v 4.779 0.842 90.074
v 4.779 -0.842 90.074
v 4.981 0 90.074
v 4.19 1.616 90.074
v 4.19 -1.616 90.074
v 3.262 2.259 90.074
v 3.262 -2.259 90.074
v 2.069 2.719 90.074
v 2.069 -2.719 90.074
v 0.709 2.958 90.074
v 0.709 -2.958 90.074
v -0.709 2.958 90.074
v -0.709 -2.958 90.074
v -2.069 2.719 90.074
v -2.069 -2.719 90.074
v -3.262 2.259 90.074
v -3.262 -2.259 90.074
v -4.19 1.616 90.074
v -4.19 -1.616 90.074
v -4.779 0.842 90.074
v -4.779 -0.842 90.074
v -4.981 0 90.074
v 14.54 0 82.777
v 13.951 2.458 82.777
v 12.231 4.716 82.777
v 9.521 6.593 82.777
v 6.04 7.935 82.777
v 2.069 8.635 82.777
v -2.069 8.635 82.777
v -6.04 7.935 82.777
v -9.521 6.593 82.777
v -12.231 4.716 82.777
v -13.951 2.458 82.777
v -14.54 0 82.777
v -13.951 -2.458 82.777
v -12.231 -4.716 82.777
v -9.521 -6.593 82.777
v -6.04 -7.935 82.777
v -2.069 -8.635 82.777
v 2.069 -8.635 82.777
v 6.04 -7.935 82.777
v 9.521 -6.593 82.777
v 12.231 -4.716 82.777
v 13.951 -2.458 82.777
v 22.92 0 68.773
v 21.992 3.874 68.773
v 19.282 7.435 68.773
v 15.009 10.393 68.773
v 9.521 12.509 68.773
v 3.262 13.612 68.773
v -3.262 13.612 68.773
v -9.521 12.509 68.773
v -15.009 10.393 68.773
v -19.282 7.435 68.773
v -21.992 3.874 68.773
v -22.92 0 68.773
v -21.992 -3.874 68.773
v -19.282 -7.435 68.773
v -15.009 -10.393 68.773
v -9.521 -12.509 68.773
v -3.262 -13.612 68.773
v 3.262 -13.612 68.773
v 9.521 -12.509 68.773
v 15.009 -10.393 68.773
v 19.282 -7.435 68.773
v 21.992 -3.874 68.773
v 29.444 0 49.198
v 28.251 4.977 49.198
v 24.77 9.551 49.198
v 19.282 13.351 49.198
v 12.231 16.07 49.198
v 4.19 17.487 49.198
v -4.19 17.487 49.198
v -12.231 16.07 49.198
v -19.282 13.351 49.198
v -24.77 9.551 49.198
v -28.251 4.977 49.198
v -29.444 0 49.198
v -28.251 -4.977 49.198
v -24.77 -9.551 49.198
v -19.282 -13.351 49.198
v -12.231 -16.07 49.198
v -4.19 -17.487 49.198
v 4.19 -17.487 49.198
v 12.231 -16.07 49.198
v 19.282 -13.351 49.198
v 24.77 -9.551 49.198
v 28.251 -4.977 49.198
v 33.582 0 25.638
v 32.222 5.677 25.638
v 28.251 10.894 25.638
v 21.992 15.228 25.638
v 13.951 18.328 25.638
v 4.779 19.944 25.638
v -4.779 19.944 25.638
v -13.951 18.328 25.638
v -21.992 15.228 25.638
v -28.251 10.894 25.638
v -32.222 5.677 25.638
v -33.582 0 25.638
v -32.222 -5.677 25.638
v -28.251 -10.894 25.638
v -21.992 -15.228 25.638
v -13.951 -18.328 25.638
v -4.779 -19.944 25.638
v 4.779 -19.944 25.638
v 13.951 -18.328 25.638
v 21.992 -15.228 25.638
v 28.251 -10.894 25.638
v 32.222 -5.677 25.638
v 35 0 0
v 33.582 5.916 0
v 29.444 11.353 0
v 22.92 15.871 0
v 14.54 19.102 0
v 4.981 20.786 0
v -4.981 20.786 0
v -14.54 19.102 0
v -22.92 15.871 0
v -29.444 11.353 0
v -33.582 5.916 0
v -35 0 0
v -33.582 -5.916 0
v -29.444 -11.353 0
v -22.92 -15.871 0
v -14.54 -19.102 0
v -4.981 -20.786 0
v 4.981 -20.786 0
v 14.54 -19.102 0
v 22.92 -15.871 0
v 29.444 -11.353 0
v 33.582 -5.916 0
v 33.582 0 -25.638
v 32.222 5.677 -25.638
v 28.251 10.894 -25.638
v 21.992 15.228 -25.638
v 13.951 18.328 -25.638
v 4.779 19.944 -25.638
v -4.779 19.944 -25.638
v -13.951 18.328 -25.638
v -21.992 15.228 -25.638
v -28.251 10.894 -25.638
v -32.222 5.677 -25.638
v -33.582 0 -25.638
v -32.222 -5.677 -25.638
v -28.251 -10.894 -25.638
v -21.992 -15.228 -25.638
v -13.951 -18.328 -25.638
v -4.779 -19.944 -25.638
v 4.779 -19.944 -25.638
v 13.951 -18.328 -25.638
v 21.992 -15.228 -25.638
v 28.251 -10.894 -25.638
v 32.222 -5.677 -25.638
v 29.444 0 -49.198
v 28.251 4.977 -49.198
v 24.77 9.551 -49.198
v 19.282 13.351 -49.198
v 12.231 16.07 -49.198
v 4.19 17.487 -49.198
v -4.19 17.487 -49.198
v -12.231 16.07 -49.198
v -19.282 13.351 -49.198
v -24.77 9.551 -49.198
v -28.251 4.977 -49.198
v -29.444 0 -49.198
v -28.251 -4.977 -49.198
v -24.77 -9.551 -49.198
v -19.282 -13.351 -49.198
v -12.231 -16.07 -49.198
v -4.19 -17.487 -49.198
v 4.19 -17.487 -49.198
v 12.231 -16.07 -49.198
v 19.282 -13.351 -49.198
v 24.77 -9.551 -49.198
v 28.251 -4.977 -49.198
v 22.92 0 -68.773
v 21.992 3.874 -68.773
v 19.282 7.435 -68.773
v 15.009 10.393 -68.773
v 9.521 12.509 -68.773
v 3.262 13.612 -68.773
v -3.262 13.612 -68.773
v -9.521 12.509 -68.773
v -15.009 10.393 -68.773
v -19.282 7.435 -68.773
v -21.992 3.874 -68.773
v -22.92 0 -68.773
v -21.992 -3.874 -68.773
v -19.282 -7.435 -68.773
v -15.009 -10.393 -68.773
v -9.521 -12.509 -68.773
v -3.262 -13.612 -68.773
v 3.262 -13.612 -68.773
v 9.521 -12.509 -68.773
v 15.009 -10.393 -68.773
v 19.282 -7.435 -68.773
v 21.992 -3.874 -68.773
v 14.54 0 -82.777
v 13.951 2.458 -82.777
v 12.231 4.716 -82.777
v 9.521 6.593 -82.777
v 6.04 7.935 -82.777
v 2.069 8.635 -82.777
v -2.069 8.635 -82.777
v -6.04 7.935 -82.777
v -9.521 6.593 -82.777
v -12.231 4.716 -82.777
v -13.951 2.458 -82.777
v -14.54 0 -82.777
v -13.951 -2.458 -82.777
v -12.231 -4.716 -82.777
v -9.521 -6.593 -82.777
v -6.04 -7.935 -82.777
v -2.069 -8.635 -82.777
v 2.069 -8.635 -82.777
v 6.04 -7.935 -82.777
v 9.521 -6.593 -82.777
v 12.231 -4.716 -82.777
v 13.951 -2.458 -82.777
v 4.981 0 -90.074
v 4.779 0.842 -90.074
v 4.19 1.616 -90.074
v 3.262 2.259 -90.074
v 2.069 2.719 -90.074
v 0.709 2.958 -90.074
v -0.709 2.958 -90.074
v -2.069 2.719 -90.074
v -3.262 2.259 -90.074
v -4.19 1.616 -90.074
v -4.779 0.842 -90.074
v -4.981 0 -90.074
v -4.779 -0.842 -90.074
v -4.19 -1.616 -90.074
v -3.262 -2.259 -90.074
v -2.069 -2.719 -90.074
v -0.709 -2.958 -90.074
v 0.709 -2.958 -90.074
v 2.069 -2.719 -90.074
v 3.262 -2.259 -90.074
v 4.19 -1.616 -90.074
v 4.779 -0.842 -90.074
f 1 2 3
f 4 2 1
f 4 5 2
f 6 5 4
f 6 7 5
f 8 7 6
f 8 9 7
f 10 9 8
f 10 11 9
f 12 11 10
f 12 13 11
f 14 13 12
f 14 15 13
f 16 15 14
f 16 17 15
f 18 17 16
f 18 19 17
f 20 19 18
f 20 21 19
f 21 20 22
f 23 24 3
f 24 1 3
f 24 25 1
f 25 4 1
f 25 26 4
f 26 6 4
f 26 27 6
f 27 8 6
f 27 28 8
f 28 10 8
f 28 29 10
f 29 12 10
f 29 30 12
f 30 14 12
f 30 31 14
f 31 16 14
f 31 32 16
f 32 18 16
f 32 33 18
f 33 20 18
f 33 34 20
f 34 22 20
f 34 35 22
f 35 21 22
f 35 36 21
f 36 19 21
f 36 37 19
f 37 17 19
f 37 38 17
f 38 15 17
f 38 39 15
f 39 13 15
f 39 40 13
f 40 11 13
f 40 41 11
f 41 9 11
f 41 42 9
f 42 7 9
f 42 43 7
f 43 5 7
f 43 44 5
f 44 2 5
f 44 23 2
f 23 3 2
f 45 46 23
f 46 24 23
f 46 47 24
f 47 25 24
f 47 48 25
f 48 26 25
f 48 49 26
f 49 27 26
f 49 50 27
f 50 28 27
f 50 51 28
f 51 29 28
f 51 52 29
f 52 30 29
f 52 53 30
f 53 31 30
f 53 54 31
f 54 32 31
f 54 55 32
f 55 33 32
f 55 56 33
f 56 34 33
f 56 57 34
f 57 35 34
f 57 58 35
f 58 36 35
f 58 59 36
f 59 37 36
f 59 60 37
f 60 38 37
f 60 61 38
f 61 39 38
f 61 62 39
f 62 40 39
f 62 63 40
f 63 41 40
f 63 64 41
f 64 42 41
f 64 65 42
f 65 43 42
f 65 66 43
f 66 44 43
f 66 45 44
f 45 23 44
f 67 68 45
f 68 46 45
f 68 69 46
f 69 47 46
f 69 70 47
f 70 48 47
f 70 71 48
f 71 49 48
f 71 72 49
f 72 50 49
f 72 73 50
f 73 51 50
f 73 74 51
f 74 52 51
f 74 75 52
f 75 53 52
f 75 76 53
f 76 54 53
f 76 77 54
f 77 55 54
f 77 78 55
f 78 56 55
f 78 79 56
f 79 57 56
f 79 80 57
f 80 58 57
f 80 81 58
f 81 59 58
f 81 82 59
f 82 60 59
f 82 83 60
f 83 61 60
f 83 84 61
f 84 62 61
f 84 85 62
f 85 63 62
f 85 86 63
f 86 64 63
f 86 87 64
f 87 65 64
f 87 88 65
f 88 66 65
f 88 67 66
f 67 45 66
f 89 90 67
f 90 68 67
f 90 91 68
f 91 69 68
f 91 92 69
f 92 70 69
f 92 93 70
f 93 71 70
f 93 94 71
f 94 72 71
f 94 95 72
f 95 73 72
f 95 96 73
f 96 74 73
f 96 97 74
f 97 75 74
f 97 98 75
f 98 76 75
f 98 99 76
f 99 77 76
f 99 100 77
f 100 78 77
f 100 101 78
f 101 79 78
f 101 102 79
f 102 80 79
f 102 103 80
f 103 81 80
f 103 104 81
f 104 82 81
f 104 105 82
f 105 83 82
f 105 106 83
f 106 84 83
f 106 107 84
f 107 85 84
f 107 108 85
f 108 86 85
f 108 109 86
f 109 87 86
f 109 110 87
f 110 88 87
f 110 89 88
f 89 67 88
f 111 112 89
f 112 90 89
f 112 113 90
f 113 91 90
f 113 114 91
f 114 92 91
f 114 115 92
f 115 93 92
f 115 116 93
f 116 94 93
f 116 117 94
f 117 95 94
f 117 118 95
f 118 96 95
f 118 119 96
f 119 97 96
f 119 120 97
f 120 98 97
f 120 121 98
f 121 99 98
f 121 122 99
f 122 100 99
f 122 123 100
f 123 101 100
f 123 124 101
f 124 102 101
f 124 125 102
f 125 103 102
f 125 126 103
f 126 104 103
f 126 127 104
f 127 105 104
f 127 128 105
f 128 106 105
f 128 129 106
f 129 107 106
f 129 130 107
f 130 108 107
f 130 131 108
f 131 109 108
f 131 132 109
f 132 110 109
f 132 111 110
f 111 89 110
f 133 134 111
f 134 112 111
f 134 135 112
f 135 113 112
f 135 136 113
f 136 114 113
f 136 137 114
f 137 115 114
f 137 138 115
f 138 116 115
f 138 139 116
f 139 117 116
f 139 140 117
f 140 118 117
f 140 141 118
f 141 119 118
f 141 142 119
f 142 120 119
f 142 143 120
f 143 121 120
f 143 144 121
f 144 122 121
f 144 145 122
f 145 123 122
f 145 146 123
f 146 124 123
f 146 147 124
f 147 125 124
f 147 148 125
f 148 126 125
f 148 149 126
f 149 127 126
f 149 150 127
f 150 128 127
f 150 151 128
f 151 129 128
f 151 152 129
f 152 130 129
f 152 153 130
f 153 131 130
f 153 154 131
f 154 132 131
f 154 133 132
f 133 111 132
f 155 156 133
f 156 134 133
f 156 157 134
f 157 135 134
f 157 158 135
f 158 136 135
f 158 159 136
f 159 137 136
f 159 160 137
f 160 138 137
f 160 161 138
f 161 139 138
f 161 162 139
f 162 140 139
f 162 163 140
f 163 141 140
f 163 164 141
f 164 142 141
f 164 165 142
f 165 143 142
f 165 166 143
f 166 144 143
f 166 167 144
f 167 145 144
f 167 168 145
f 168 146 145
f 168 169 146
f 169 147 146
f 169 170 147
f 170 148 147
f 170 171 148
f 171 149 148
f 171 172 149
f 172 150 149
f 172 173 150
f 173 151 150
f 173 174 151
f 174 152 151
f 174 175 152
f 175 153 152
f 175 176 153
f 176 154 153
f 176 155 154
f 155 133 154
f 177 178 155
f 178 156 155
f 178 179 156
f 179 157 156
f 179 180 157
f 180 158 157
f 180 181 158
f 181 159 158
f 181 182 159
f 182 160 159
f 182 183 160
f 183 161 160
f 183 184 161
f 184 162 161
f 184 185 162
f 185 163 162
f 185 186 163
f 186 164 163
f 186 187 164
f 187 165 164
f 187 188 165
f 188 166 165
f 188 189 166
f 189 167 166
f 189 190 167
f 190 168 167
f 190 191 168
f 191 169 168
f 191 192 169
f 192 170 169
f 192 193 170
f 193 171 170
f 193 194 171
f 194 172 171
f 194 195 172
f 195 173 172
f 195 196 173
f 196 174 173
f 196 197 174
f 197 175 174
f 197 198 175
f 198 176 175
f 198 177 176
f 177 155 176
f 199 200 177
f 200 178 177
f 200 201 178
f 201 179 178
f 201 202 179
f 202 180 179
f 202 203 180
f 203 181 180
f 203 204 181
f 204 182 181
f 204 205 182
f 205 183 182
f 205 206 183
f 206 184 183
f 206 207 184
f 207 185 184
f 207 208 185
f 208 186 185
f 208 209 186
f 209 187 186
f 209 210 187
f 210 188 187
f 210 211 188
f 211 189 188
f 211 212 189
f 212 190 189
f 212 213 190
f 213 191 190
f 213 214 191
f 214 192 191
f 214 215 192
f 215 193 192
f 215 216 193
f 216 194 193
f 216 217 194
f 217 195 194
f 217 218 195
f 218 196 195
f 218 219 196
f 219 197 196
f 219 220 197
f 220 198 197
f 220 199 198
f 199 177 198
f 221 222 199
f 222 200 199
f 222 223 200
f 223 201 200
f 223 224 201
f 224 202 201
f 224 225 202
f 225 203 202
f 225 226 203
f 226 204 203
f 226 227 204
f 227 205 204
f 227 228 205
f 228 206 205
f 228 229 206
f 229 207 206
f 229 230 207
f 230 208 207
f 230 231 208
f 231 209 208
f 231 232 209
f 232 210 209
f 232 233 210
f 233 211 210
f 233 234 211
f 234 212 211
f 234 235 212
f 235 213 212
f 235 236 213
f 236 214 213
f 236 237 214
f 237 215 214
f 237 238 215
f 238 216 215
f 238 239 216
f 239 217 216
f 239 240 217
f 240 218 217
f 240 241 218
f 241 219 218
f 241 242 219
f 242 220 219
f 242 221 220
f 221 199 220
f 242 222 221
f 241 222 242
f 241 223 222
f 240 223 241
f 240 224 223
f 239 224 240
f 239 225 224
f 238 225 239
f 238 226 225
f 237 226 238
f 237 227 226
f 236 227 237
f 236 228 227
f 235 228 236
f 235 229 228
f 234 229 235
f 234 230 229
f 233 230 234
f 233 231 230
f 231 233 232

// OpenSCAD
// Generated by SolidPython 1.0.1 on 2020-07-29 00:46:46


scale(v = [5, 3, 13]) {
	sphere(r = 7);
}
/***********************************************
*********      SolidPython code:      **********
************************************************
 
# import packages: SolidPython
from solid import *
from solid.utils import *
from itertools import chain, combinations, permutations


class Resize:

    def __init__(self, scad_file):
        self.scad_file = scad_file
        #self.scad_file = import_scad(scad_file)
        # cone/cylinder param:
        self.r1 = 0
        self.r2 = 0
        self.h = 0
        # rectangular prism param:
        self.w = 0
        self.l = 0
        # ellipse param:
        self.r = 0

    # import OpenScad code (file name corresponds to shape)


    # classify shape + parameters
    def assign(self, param1, param2, param3):
        if self.scad_file == 'cone.scad':
            self.r1 = param1
            self.r2 = param2
            self.h = param3
        elif self.scad_file == 'cylinder.scad':
            self.r1 = param1
            self.r2 = param2
            self.h = param3
        elif self.scad_file == 'rectangularPrism.scad':
            self.h = param1
            self.l = param2
            self.w = param3
        else:
            self.r = param1
            self.h = param2

    # resize parameters
    def iterate(self):
        x = range(3, 20, 2)
        i = 1
        if self.scad_file == 'cone.scad':
            tempList = list(permutations(x, 2))
            for temp in tempList:
                param1 = temp[0]
                param2 = temp[1]
                filepath = 'produced_scad_files/' + 'cone' + str(param1) + '_' + str(param2) + '_' + '.scad'
                scad_render_to_file(cylinder(h=param1, r1=param2, r2=0), filepath)

        elif self.scad_file == 'cylinder.scad':
            tempList = list(permutations(x, 3))
            for temp in tempList:
                param1 = temp[0]
                param2 = temp[1]
                filepath = 'produced_scad_files/' + 'cylinder' + str(param1) + '_' + str(param2) + '_' + '.scad'
                scad_render_to_file(cylinder(h=param1, r1=param2, r2=param2), filepath)

        elif self.scad_file == 'rectangularPrism.scad':
            tempList = list(permutations(x, 3))
            for temp in tempList:
                param1 = temp[0]
                param2 = temp[1]
                param3 = temp[2]
                filepath = 'produced_scad_files/' + 'rectangularPrism' + str(param1) + '_' + str(param2) + '_' + str(
                    param3) + '.scad'
                scad_render_to_file(cube(size=(param1, param2, param3)), filepath)

        elif self.scad_file == 'ellipse.scad':
            tempList = list(permutations(x, 4))
            for temp in tempList:
                param1 = temp[0]
                param2 = temp[1]
                param3 = temp[2]
                param4 = temp[3]
                filepath = 'produced_scad_files/' + 'ellipse' + str(param1) + '_' + str(param2) + '_' + str(param3) + '_' + str(param4) + '.scad'
                scad_render_to_file(scale([param1, param2, param3])(sphere(r=param4)), filepath)

    def render_to_scadfile(self):
        scad_render_to_file(scad, 'example.scad') 
 
************************************************/
